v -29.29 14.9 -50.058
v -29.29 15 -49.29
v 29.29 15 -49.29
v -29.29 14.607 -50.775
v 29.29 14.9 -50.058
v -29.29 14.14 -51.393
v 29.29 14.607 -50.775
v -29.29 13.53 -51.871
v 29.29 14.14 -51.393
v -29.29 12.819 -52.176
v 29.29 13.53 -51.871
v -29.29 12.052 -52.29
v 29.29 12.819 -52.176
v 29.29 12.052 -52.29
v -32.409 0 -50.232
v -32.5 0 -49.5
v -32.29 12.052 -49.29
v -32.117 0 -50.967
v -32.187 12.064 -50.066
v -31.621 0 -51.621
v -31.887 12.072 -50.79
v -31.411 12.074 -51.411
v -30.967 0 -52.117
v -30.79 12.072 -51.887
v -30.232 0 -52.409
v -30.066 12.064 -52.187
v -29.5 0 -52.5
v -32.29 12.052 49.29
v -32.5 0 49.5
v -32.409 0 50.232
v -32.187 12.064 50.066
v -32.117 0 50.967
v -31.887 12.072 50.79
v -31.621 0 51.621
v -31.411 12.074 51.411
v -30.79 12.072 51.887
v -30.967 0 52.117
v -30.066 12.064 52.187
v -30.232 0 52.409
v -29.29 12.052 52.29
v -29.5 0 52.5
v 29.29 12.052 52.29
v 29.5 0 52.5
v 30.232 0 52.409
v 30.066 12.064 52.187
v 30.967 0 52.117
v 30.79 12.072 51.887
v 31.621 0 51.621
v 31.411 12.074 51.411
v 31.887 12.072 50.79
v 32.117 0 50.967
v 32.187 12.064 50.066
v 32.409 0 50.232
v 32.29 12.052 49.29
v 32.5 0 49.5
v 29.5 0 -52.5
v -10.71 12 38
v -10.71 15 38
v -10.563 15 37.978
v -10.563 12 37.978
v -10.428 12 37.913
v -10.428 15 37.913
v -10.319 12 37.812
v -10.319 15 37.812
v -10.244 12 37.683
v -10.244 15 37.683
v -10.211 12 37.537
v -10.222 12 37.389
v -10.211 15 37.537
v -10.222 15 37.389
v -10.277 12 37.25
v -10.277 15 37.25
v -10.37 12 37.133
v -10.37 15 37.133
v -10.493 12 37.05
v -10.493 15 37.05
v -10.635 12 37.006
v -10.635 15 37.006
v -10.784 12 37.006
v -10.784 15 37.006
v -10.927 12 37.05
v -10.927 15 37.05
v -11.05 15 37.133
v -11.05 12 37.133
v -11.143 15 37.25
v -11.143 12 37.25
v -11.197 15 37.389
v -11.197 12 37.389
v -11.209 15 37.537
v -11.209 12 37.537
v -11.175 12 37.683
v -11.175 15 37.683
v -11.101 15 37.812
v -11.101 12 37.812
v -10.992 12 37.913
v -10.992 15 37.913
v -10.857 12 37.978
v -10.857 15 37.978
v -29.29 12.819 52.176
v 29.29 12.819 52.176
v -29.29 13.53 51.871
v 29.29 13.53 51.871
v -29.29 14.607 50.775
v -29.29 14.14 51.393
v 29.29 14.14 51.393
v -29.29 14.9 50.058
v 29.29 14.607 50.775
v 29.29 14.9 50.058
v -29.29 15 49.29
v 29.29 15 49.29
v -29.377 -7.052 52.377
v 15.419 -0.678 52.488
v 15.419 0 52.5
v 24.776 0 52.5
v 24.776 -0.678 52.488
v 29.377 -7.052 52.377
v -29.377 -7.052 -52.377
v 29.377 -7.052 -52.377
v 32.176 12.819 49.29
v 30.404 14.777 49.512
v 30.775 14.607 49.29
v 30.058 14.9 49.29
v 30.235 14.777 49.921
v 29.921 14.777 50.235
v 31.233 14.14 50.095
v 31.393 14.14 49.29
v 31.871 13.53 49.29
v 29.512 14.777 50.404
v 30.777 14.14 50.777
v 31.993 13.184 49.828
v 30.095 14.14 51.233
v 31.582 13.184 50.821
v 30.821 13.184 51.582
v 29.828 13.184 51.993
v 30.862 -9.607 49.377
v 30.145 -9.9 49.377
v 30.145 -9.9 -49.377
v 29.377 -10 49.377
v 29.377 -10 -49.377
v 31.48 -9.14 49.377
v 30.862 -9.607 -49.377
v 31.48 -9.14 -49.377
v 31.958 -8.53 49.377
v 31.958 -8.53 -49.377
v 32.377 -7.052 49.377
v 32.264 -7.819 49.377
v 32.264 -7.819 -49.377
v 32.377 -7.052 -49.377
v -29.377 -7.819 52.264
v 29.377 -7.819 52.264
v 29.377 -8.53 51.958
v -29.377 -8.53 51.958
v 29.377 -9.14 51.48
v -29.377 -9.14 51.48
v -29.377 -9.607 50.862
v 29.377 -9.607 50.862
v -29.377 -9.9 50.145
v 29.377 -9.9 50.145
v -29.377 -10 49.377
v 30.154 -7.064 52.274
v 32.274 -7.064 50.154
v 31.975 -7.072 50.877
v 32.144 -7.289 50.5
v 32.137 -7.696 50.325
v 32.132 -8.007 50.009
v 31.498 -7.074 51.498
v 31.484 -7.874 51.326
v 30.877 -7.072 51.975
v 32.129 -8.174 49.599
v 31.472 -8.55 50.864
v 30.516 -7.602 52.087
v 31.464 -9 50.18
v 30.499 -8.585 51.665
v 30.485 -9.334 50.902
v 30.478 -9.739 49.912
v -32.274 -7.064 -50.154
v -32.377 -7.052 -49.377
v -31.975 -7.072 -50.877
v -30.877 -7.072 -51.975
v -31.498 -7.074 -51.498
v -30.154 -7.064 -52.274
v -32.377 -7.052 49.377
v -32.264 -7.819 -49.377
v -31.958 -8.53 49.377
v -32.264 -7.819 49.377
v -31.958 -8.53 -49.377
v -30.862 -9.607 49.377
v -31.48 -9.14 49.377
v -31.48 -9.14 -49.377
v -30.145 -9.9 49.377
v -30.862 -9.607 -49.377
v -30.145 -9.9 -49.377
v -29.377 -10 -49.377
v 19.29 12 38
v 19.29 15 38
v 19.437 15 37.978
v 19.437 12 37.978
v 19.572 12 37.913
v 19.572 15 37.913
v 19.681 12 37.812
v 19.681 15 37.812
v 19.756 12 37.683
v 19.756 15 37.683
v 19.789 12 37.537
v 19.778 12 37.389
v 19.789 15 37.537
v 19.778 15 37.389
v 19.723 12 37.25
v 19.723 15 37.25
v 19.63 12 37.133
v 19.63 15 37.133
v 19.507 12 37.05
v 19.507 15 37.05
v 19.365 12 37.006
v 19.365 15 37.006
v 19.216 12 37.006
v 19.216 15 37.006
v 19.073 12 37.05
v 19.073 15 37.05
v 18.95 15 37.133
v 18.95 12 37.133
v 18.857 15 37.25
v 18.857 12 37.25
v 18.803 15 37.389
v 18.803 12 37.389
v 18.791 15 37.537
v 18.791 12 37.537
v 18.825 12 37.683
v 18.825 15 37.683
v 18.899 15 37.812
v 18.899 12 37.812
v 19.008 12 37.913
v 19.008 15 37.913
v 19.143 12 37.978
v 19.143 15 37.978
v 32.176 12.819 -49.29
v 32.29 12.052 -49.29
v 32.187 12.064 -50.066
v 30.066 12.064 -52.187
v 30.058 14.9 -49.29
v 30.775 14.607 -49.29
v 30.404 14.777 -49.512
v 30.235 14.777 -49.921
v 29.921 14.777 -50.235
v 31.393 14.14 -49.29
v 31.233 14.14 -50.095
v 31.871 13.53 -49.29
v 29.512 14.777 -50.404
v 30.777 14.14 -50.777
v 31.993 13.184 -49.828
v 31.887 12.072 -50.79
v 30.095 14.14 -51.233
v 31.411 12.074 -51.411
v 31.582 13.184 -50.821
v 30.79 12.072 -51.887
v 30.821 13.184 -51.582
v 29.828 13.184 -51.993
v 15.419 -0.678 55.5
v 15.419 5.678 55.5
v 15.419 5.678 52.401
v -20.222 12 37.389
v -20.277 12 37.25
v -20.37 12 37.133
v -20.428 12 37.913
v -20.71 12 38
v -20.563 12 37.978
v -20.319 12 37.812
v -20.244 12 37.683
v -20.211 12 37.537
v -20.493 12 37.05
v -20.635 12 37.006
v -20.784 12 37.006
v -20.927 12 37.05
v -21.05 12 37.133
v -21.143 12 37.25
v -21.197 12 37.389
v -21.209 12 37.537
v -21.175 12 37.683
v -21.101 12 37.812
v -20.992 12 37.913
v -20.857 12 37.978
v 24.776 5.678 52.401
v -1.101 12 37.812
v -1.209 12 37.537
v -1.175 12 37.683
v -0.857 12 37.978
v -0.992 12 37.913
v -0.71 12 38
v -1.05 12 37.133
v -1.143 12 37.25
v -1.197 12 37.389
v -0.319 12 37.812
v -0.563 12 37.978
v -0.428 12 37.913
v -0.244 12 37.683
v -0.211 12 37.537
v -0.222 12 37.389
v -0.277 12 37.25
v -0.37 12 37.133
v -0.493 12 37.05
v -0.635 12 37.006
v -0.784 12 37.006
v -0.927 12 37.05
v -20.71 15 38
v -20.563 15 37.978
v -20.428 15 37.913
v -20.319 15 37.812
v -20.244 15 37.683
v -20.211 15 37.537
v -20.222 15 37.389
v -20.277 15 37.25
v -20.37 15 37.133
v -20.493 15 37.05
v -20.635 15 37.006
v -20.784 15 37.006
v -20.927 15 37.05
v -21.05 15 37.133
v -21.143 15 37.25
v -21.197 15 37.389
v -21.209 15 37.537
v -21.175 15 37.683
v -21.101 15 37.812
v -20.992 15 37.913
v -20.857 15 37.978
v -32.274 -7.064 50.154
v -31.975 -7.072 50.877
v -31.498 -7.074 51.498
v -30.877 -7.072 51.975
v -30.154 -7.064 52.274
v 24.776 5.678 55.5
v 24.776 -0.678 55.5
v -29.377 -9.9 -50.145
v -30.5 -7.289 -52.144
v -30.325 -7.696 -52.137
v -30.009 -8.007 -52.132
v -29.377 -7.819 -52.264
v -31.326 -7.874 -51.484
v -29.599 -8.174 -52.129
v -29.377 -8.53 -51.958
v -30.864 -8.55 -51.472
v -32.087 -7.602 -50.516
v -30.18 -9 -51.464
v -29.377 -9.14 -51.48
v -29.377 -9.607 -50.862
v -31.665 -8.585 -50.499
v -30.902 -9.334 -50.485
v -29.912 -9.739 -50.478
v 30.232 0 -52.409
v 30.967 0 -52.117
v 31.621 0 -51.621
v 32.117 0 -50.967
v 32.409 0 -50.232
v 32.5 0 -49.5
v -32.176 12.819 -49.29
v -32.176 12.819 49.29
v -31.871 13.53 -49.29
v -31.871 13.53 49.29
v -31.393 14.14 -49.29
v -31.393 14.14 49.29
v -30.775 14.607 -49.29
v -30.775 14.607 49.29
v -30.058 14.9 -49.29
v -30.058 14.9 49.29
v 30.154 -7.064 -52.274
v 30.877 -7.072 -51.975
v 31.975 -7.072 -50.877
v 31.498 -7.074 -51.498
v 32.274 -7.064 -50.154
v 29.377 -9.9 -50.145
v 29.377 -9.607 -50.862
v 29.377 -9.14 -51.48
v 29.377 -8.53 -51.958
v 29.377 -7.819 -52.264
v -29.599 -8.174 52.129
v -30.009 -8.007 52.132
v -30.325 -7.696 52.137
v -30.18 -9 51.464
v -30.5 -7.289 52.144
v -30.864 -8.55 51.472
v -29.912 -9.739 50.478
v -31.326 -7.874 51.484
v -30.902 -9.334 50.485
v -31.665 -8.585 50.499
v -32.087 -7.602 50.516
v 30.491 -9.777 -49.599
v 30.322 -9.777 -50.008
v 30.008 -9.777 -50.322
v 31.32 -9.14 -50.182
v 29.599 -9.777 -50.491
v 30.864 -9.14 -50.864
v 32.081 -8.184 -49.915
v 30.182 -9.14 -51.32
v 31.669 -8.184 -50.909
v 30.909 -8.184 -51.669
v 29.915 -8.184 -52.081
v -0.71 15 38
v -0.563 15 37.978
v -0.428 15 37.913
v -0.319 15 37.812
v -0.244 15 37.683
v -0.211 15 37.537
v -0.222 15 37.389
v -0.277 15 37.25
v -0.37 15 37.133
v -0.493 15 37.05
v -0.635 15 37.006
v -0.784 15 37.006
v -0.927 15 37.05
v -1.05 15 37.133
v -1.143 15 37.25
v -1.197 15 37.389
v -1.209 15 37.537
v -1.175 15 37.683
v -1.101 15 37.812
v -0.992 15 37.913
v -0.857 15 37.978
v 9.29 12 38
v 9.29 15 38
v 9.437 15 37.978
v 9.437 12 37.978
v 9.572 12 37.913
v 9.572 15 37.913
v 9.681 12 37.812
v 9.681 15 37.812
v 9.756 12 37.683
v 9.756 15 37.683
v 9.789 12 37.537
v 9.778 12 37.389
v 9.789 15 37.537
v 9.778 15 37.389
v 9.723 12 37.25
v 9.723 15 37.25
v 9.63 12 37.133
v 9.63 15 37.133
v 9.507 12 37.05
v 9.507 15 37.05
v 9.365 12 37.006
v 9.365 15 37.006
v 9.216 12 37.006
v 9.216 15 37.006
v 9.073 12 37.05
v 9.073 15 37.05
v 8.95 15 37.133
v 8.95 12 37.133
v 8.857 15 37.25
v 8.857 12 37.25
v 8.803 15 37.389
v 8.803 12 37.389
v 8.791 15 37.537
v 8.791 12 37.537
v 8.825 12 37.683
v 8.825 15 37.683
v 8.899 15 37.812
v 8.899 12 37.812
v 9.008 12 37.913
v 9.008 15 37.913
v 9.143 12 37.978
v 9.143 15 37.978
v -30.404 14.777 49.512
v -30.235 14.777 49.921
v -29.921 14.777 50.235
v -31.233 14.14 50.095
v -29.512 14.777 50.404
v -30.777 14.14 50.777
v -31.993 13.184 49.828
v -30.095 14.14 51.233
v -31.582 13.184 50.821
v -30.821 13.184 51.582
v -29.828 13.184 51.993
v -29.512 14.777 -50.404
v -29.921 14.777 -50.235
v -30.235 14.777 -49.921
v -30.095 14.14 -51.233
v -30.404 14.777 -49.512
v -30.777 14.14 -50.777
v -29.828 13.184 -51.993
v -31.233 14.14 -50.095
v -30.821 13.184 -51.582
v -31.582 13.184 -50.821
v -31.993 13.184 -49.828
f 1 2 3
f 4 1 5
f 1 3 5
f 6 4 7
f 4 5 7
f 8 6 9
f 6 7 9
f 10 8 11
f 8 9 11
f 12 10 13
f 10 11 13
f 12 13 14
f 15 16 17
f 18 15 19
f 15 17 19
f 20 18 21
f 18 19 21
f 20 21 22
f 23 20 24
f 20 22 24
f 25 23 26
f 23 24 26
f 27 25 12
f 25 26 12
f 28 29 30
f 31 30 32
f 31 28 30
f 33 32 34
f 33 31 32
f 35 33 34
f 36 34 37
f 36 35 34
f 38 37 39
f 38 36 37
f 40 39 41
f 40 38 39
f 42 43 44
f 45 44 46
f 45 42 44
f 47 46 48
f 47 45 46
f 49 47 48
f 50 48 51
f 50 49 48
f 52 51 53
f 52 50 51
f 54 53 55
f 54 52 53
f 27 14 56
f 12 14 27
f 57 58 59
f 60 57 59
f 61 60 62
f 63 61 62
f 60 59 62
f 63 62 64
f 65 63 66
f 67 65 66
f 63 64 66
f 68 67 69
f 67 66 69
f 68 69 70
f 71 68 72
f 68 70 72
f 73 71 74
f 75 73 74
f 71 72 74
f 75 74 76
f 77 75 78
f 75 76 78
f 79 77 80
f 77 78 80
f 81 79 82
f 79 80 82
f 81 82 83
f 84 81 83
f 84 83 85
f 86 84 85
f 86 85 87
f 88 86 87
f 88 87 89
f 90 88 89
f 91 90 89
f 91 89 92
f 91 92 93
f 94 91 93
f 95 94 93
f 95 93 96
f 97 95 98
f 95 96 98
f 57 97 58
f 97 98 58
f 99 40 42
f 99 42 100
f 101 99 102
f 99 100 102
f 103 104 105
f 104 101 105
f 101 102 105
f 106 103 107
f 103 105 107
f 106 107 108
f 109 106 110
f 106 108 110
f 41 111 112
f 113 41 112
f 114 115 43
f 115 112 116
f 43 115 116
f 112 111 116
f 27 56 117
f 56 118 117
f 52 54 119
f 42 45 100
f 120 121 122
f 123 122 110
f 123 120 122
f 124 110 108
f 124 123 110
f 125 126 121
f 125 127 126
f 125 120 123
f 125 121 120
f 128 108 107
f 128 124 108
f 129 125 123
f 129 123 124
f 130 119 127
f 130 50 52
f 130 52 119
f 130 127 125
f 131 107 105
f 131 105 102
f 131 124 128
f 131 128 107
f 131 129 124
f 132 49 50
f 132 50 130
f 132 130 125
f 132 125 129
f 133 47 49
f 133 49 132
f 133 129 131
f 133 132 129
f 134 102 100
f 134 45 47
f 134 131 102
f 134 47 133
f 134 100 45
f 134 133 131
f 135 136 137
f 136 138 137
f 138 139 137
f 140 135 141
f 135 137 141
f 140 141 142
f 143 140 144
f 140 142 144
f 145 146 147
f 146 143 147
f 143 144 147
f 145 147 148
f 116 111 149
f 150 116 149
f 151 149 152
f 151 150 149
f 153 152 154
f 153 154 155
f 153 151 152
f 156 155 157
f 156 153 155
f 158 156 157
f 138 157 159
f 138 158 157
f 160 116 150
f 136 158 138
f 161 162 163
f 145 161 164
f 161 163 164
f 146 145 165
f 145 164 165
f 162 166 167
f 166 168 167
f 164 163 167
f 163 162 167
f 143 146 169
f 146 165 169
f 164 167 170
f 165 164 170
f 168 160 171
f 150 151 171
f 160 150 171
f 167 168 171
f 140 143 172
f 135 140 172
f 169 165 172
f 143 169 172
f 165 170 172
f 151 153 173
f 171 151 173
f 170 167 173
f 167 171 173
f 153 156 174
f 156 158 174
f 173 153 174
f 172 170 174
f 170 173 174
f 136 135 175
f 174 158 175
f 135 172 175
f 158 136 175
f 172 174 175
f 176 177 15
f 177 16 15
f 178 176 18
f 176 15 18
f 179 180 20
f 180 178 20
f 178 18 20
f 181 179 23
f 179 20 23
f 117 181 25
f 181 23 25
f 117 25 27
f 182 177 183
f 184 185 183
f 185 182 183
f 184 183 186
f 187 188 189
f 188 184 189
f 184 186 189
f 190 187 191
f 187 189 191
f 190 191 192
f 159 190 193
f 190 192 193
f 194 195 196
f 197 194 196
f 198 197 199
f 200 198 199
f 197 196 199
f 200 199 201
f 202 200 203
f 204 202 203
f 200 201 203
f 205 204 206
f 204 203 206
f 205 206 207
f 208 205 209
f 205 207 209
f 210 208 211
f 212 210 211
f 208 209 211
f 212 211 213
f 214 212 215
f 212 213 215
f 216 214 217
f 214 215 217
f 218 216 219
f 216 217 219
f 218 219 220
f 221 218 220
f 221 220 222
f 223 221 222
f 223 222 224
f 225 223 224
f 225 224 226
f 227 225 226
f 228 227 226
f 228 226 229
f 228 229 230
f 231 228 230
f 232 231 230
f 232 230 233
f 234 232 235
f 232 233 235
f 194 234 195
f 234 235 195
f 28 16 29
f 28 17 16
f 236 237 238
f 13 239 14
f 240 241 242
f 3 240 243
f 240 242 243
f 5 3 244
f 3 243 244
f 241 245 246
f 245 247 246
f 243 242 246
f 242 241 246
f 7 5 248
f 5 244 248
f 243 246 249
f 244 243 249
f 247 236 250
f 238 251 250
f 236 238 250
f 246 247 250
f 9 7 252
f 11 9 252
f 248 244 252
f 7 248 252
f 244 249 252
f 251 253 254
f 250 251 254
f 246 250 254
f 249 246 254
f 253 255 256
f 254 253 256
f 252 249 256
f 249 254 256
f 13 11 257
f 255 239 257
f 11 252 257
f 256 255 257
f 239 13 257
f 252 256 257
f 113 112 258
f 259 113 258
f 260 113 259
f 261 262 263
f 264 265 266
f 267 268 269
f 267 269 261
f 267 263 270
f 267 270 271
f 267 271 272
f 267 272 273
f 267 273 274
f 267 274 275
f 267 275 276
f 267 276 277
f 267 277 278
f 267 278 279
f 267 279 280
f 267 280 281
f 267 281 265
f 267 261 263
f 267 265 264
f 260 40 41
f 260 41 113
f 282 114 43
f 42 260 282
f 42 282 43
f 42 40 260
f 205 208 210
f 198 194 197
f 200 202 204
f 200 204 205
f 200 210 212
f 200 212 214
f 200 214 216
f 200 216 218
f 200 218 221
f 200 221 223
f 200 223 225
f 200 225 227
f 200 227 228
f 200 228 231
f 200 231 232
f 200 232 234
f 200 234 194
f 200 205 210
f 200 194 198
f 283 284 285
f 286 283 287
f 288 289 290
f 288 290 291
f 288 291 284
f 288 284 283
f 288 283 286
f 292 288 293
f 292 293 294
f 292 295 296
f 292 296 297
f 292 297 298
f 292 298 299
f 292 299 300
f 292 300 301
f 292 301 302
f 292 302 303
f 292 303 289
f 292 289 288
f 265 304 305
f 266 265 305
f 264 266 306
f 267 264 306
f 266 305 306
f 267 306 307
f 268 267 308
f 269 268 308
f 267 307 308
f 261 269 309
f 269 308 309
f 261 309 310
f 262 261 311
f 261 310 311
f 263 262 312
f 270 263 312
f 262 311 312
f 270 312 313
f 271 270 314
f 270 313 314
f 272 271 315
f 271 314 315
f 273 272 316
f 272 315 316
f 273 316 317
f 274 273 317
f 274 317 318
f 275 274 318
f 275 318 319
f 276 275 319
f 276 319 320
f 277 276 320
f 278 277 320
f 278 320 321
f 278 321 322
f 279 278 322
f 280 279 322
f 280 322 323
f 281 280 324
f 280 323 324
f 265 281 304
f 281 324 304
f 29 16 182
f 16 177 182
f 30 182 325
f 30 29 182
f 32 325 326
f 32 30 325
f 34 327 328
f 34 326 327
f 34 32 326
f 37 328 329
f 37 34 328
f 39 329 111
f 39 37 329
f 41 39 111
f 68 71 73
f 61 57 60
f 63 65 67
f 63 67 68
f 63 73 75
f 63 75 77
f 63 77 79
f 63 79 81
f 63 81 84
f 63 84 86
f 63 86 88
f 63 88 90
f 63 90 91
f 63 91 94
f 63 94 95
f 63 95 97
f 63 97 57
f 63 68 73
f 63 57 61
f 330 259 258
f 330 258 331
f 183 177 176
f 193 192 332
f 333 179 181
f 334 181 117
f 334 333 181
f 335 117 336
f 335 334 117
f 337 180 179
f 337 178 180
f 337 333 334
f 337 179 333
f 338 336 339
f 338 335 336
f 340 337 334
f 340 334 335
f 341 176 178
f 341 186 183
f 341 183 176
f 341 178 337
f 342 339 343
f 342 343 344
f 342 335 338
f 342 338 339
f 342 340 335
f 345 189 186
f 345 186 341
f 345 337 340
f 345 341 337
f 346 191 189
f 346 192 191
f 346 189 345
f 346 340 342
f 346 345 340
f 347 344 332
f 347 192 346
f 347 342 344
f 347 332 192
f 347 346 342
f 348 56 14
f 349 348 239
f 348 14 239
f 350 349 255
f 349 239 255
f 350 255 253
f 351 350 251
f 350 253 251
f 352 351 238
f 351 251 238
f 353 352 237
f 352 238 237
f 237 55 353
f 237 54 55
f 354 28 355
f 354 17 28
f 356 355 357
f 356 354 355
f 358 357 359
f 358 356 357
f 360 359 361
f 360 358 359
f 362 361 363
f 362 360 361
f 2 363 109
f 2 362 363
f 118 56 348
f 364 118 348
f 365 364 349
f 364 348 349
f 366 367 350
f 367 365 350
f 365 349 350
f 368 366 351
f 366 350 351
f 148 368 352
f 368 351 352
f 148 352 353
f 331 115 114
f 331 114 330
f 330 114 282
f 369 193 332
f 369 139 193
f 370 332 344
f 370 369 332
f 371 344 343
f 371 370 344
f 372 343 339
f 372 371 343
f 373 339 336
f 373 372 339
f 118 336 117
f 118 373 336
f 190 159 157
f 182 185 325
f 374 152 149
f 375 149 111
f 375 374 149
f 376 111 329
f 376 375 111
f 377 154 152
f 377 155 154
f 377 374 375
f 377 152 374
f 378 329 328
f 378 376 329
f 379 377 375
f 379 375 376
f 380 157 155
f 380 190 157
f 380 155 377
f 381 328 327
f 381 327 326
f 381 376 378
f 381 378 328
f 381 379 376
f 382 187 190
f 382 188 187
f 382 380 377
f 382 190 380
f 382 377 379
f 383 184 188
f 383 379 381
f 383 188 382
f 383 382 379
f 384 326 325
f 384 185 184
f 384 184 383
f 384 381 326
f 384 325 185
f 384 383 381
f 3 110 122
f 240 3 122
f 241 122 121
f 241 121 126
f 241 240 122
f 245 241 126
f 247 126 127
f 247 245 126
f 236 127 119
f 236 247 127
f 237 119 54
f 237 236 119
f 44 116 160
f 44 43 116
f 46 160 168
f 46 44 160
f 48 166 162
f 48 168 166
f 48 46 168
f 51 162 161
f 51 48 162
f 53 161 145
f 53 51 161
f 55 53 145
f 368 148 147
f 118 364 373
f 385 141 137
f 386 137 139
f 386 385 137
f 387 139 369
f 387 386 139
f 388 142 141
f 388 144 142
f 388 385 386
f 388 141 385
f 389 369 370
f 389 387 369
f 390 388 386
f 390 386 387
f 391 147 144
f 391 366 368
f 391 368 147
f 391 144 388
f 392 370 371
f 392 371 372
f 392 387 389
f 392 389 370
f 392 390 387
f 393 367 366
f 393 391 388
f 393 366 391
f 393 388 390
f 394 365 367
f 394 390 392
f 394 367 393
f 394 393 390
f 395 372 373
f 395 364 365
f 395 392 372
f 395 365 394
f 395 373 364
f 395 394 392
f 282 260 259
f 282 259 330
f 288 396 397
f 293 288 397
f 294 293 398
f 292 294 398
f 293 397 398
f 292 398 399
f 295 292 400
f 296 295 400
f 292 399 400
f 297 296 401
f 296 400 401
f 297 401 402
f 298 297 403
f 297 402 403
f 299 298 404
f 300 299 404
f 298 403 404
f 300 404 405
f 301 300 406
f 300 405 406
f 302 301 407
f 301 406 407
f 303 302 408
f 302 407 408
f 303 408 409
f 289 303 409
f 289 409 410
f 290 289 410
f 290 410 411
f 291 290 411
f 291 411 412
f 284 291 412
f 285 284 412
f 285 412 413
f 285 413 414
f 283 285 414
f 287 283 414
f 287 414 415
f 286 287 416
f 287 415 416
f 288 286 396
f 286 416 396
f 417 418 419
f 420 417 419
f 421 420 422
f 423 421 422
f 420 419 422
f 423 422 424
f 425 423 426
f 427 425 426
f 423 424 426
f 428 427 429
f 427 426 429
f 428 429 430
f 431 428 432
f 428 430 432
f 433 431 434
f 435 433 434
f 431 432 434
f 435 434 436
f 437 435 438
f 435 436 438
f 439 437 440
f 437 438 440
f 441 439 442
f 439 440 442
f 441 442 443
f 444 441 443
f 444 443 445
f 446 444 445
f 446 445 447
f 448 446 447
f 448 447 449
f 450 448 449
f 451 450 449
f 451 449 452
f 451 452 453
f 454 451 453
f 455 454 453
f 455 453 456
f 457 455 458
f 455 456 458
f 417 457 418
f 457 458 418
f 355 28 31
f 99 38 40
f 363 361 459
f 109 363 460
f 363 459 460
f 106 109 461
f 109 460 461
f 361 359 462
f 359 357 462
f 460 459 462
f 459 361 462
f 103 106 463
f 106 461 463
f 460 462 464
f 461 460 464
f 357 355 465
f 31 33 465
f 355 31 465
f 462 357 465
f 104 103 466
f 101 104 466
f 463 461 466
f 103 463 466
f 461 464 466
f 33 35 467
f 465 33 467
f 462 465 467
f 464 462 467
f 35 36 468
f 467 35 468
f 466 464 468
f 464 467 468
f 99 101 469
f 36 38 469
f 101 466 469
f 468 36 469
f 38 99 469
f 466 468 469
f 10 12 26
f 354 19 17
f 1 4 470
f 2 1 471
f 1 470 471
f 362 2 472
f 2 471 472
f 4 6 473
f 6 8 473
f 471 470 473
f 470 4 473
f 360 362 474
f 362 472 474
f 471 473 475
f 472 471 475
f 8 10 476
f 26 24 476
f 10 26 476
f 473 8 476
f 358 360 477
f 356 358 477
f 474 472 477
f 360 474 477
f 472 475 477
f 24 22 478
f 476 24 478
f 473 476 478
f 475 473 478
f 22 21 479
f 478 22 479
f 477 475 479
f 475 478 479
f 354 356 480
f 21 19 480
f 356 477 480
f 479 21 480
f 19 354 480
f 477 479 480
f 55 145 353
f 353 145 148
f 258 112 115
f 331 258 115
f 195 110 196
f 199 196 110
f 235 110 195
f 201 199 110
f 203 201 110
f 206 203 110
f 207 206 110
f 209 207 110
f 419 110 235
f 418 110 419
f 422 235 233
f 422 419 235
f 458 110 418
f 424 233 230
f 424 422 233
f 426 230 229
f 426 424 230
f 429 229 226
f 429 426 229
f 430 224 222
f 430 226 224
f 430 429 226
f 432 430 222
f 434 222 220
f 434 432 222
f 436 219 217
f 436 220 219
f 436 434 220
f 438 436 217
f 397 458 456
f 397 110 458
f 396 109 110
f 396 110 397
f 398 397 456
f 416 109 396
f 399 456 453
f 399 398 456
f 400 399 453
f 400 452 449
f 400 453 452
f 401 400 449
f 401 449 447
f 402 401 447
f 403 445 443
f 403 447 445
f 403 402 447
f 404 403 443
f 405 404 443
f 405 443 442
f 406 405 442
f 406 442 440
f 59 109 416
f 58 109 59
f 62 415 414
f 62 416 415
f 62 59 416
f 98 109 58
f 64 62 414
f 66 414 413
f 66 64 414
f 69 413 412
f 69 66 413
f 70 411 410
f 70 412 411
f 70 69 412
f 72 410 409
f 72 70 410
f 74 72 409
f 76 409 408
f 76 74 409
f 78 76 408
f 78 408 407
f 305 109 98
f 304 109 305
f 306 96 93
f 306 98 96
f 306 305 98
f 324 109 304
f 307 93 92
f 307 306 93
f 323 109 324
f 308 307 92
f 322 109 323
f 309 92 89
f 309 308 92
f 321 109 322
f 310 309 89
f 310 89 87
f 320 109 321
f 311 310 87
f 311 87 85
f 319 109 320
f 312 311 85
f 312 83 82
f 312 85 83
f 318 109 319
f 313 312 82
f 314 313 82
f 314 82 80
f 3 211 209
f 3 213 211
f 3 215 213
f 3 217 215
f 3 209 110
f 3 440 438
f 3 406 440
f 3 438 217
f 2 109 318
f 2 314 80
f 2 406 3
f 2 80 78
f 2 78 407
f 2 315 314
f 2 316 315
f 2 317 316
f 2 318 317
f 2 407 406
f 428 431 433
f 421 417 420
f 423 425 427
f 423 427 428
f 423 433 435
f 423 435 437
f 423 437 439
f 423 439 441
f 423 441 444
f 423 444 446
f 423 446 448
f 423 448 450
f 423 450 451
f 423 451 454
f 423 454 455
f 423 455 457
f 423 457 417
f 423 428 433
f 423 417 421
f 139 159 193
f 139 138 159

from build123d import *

# Parameters (mm, degrees)
SKETCH1_W                     = 65
SKETCH1_H                     = 105
BOSS_EXTRUDE1_DEPTH           = 15
BOSS_EXTRUDE1_TAPER           = 1
BOSS_EXTRUDE1_OTHER_WAY_DEPTH = 10
BOSS_EXTRUDE1_OTHER_WAY_TAPER = 1
FILLET1_R                     = 3
BOSS_EXTRUDE2_DEPTH           = 3
BOSS_EXTRUDE2_DEPTH_BACK      = 3
BOSS_EXTRUDE2_START           = 52.5
SKETCH3_W                     = 9.357586106
SKETCH3_H                     = 6.356143016
SKETCH5_R                     = 0.5
CUT_EXTRUDE1_DEPTH            = 3


with BuildPart() as part:
    # Sketch1 → Boss-Extrude1 (new body)
    with BuildSketch(Plane(origin=(0, 0, 0), x_dir=(1, 0, 0), z_dir=(0, 1, 0))):
        Rectangle(SKETCH1_W, SKETCH1_H)
    extrude(amount=BOSS_EXTRUDE1_DEPTH, taper=BOSS_EXTRUDE1_TAPER)

    # Sketch1 → Boss-Extrude1 other way (add)
    with BuildSketch(Plane(origin=(0, 0, 0), x_dir=(1, 0, 0), z_dir=(0, 1, 0))):
        Rectangle(SKETCH1_W, SKETCH1_H)
    extrude(amount=-BOSS_EXTRUDE1_OTHER_WAY_DEPTH, taper=BOSS_EXTRUDE1_OTHER_WAY_TAPER)

    # Fillet1
    fillet1_edges = [part.edges().sort_by_distance(p)[0] for p in [
        (-32.325449351, -10, 0),
        (0, -10, 52.325449351),
        (32.369087013, 7.5, 52.369087013),
        (32.369087013, 7.5, -52.369087013),
        (-32.369087013, 7.5, -52.369087013),
        (-32.369087013, 7.5, 52.369087013),
        (32.238174026, 15, 0),
        (0, 15, -52.238174026),
        (-32.238174026, 15, 0),
        (0, 15, 52.238174026),
        (32.325449351, -10, 0),
        (0, -10, -52.325449351),
        (32.412724675, -5, 52.412724675),
        (-32.412724675, -5, 52.412724675),
        (-32.412724675, -5, -52.412724675),
        (32.412724675, -5, -52.412724675),
    ]]
    fillet(fillet1_edges, radius=FILLET1_R)

    # Sketch3 → Boss-Extrude2 (add, two sides: drawn at the far end of the back side and taken through both)
    with BuildSketch(Plane.XY.offset(BOSS_EXTRUDE2_START - BOSS_EXTRUDE2_DEPTH_BACK)):
        with Locations((20.097339375, 2.5)):
            Rectangle(SKETCH3_W, SKETCH3_H)
    extrude(amount=BOSS_EXTRUDE2_DEPTH + BOSS_EXTRUDE2_DEPTH_BACK)

    # Sketch5 → Cut-Extrude1 (cut)
    with BuildSketch(Plane(origin=(0, 15, 0), x_dir=(1, 0, 0), z_dir=(0, 1, 0))):
        with Locations(Location((19.290082237, -37.5, 0), (0, 0, 270))):
            Circle(SKETCH5_R)
        with Locations(Location((9.290082237, -37.5, 0), (0, 0, 270))):
            Circle(SKETCH5_R)
        with Locations(Location((-0.709917763, -37.5, 0), (0, 0, 270))):
            Circle(SKETCH5_R)
        with Locations(Location((-10.709917763, -37.5, 0), (0, 0, 270))):
            Circle(SKETCH5_R)
        with Locations(Location((-20.709917763, -37.5, 0), (0, 0, 270))):
            Circle(SKETCH5_R)
    extrude(amount=-CUT_EXTRUDE1_DEPTH, mode=Mode.SUBTRACT)


solid = part.part
